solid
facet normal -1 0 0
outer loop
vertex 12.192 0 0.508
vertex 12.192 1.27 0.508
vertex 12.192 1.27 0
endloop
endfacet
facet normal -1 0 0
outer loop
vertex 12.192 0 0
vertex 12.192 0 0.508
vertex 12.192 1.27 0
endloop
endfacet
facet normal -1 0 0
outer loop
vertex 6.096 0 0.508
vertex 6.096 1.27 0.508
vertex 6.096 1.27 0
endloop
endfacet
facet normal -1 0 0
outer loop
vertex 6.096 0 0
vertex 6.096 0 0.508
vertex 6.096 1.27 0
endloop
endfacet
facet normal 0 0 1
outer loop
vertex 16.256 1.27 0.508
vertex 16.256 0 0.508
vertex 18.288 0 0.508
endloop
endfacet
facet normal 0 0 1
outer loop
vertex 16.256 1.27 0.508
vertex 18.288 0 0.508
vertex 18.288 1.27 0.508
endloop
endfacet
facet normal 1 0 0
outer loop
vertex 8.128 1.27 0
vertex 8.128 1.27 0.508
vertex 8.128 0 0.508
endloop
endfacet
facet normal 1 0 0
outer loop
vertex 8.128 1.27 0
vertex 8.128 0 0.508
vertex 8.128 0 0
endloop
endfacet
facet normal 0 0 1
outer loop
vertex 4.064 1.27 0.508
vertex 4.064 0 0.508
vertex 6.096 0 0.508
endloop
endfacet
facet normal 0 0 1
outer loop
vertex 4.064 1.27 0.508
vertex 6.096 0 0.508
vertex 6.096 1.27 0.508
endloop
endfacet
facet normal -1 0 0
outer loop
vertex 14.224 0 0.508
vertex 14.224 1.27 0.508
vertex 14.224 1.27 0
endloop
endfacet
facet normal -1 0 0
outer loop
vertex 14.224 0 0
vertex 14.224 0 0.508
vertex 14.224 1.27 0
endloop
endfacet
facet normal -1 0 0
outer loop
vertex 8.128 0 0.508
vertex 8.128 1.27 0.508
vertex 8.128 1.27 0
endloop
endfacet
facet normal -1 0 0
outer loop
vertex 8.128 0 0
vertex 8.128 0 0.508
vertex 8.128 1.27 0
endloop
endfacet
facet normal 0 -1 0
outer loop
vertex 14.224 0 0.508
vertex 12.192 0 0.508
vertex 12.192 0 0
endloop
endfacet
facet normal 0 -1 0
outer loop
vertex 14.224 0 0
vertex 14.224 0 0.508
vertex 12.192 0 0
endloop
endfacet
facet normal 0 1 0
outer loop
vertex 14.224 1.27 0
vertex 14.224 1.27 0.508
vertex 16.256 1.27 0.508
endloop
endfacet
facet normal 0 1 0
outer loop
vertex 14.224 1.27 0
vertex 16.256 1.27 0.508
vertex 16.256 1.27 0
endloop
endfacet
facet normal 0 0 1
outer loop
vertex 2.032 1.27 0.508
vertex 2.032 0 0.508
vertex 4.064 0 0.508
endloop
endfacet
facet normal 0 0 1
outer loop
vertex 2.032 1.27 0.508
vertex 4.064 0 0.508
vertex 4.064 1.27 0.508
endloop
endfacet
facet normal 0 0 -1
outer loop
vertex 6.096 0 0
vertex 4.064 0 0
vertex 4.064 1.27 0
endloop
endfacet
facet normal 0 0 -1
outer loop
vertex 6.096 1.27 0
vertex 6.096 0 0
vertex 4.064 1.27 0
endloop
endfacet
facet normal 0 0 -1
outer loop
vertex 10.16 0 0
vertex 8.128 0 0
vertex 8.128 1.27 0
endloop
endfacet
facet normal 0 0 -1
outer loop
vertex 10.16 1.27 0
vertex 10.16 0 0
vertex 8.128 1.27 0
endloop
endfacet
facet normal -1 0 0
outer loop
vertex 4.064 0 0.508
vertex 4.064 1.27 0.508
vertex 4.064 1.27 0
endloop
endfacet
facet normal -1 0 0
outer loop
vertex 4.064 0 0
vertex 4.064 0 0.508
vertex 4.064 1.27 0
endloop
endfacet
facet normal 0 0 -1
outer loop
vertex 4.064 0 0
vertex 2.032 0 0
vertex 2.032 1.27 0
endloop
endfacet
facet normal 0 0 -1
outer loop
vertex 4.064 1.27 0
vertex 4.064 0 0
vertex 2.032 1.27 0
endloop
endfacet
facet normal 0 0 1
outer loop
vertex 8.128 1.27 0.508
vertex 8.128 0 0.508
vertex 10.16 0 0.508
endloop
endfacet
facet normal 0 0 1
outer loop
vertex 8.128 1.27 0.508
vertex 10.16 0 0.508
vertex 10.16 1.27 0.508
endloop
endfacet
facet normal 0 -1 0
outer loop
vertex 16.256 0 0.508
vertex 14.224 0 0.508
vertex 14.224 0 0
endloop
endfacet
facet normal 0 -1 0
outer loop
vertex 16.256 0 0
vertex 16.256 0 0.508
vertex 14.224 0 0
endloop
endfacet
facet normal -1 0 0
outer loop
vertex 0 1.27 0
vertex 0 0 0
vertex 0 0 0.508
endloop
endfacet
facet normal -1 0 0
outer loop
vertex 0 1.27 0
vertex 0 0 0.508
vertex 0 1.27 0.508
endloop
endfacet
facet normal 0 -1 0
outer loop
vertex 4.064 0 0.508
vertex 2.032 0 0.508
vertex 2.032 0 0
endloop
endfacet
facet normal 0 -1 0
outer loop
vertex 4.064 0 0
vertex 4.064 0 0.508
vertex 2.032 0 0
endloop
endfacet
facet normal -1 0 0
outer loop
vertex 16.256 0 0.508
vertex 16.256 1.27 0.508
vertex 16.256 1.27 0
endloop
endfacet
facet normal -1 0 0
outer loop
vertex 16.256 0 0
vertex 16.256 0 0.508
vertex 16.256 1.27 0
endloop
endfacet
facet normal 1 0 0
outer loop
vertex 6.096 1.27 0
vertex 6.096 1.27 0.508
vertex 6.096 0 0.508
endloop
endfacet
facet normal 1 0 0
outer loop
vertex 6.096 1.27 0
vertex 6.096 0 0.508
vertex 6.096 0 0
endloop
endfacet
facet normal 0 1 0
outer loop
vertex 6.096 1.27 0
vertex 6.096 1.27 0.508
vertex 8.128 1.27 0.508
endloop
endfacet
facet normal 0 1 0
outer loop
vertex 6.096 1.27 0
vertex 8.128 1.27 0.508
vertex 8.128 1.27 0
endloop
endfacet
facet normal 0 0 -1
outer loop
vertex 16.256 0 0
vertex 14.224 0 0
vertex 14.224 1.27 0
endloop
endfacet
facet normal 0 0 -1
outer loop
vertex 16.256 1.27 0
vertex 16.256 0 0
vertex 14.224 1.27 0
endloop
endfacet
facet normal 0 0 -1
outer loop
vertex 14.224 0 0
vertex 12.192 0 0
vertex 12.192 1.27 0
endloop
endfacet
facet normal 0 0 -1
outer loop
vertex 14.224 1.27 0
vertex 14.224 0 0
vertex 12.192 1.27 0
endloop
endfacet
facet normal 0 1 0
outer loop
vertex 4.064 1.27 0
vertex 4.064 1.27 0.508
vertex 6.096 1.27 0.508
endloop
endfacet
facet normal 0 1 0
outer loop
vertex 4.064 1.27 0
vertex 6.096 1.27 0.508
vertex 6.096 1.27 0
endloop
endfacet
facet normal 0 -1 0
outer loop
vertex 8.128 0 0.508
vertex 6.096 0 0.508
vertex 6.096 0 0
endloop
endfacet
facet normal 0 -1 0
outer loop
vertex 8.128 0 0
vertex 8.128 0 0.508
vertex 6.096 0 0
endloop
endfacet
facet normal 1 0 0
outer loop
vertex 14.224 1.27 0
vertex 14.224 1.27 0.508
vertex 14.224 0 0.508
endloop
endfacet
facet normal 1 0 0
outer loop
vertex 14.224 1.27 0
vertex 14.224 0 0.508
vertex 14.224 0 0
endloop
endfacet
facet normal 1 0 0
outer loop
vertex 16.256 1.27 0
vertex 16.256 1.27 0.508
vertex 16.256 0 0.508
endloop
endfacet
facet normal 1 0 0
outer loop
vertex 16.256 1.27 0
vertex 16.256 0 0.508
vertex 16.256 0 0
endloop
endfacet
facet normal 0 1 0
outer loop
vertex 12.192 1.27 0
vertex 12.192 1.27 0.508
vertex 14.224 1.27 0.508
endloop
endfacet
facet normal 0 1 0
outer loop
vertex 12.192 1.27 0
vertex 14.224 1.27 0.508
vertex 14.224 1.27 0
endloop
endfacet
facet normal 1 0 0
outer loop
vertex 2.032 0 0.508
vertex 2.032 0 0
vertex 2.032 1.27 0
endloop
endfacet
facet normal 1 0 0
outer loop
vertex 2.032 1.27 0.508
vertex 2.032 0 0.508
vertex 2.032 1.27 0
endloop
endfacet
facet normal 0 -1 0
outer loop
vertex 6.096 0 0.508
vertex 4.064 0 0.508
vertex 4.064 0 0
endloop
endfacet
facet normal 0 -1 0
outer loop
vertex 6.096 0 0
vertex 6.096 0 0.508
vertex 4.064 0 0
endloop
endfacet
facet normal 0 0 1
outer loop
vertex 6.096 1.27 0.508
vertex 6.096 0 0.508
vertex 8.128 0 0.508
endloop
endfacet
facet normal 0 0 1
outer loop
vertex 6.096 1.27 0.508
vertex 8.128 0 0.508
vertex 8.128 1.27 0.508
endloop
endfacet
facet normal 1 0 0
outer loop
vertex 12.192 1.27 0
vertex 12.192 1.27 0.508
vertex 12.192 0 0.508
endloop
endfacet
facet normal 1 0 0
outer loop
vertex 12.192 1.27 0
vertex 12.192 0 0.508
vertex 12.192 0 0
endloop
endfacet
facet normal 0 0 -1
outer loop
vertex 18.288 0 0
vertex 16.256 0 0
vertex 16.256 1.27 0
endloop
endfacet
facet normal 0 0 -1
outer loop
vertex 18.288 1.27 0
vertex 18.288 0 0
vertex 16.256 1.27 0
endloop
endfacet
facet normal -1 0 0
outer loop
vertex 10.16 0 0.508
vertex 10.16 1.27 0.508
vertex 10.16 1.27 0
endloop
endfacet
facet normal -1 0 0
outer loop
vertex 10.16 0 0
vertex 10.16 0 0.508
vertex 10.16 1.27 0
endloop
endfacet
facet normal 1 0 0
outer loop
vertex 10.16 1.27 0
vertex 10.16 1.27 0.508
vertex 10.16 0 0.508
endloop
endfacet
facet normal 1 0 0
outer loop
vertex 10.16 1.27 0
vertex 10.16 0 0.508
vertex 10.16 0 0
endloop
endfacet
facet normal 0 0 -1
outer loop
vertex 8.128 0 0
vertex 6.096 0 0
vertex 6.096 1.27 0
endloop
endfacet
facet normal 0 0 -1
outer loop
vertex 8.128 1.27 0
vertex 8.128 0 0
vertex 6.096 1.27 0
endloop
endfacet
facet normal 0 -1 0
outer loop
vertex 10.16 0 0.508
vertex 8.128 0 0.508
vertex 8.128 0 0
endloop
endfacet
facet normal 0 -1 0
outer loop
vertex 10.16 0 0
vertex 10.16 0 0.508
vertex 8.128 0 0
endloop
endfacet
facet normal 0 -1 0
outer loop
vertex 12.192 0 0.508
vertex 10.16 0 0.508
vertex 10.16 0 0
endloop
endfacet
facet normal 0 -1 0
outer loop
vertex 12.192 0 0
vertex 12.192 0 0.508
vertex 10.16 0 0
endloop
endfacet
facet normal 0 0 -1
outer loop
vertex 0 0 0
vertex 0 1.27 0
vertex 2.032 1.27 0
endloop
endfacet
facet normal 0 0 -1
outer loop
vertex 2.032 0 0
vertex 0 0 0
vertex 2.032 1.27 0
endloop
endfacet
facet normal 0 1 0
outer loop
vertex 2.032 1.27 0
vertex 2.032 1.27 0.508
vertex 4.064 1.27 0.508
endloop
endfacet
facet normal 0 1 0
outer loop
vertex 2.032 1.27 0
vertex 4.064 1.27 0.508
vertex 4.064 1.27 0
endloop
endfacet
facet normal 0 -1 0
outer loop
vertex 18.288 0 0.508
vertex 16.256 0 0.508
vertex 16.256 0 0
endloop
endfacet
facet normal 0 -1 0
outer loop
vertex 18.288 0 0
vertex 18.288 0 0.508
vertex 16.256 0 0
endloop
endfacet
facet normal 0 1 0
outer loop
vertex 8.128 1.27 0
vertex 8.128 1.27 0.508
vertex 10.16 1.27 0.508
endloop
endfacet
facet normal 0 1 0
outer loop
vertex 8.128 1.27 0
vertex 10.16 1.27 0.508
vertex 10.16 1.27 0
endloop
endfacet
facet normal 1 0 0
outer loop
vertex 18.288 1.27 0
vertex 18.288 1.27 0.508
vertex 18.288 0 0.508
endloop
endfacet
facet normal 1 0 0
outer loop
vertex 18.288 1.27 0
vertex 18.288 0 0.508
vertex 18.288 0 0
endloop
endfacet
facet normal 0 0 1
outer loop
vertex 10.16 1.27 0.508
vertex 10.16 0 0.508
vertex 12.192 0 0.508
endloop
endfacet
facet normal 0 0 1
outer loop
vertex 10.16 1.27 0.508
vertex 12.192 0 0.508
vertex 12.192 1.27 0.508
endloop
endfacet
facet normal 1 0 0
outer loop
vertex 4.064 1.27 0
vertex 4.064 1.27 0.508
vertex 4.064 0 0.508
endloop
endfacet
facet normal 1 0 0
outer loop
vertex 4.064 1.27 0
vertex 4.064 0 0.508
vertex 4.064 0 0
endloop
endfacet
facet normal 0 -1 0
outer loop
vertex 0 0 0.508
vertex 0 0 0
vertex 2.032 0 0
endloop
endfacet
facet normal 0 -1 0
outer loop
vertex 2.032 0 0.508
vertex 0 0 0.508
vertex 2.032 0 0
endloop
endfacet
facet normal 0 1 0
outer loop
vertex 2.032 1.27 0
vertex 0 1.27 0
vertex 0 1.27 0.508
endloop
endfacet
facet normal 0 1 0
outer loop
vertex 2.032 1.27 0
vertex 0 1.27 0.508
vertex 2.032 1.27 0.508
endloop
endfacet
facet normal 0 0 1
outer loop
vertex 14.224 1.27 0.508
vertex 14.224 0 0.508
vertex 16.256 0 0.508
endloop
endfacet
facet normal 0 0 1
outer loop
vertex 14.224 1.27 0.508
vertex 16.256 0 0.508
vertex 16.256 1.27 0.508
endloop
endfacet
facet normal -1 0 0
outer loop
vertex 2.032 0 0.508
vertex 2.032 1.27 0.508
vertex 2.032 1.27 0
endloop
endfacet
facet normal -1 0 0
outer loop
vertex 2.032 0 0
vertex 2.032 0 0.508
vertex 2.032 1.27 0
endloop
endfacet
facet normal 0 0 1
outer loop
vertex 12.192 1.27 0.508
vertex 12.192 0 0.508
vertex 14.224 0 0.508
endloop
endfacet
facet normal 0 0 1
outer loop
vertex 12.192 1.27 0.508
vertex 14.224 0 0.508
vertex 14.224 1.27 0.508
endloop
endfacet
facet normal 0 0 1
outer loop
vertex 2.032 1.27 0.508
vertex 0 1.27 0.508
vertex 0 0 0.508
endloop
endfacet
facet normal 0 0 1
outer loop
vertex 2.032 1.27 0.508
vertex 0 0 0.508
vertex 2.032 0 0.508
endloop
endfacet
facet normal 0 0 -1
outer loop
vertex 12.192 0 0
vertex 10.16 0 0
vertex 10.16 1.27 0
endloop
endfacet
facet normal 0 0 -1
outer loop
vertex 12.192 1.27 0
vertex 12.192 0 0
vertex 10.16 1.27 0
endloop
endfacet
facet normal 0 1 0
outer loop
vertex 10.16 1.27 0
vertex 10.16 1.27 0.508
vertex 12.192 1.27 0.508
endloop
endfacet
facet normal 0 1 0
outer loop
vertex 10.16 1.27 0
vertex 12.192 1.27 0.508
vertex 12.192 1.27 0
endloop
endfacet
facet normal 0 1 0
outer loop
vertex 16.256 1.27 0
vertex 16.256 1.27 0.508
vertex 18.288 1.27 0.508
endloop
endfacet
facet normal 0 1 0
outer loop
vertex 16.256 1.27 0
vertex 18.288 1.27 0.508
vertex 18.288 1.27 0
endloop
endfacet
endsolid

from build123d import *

# Parameters (mm, degrees)
SKETCH1_W            = 2.032
SKETCH1_H            = 1.27
BOSS_EXTRUDE1_DEPTH  = 0.508
SKETCH3_W            = 0.508
SKETCH3_H            = 1.27
BOSS_EXTRUDE3_DEPTH  = 2.032
SKETCH4_W            = 0.508
SKETCH4_H            = 1.27
BOSS_EXTRUDE4_DEPTH  = 2.032
SKETCH5_W            = 0.508
SKETCH5_H            = 1.27
BOSS_EXTRUDE5_DEPTH  = 2.032
SKETCH6_W            = 0.508
SKETCH6_H            = 1.27
BOSS_EXTRUDE6_DEPTH  = 2.032
SKETCH7_W            = 0.508
SKETCH7_H            = 1.27
BOSS_EXTRUDE7_DEPTH  = 2.032
SKETCH8_W            = 0.508
SKETCH8_H            = 1.27
BOSS_EXTRUDE8_DEPTH  = 2.032
SKETCH9_W            = 0.508
SKETCH9_H            = 1.27
BOSS_EXTRUDE9_DEPTH  = 2.032
SKETCH10_W           = 0.508
SKETCH10_H           = 1.27
BOSS_EXTRUDE10_DEPTH = 2.032


with BuildPart() as part:
    # Sketch1 → Boss-Extrude1 (new body)
    with BuildSketch(Plane.XY):
        with Locations((1.016, 0.635)):
            Rectangle(SKETCH1_W, SKETCH1_H)
    extrude(amount=BOSS_EXTRUDE1_DEPTH)


with BuildPart() as body_2:
    # Sketch3 → Boss-Extrude3 (new body)
    with BuildSketch(Plane(origin=(2.032, 0, 0), x_dir=(0, 0, -1), z_dir=(1, 0, 0))):
        with Locations((-0.254, 0.635)):
            Rectangle(SKETCH3_W, SKETCH3_H)
    extrude(amount=BOSS_EXTRUDE3_DEPTH)


with BuildPart() as body_3:
    # Sketch4 → Boss-Extrude4 (new body)
    with BuildSketch(Plane(origin=(4.064, 0, 0), x_dir=(0, 0, -1), z_dir=(1, 0, 0))):
        with Locations((-0.254, 0.635)):
            Rectangle(SKETCH4_W, SKETCH4_H)
    extrude(amount=BOSS_EXTRUDE4_DEPTH)


with BuildPart() as body_4:
    # Sketch5 → Boss-Extrude5 (new body)
    with BuildSketch(Plane(origin=(6.096, 0, 0), x_dir=(0, 0, -1), z_dir=(1, 0, 0))):
        with Locations((-0.254, 0.635)):
            Rectangle(SKETCH5_W, SKETCH5_H)
    extrude(amount=BOSS_EXTRUDE5_DEPTH)


with BuildPart() as body_5:
    # Sketch6 → Boss-Extrude6 (new body)
    with BuildSketch(Plane(origin=(8.128, 0, 0), x_dir=(0, 0, -1), z_dir=(1, 0, 0))):
        with Locations((-0.254, 0.635)):
            Rectangle(SKETCH6_W, SKETCH6_H)
    extrude(amount=BOSS_EXTRUDE6_DEPTH)


with BuildPart() as body_6:
    # Sketch7 → Boss-Extrude7 (new body)
    with BuildSketch(Plane(origin=(10.16, 0, 0), x_dir=(0, 0, -1), z_dir=(1, 0, 0))):
        with Locations((-0.254, 0.635)):
            Rectangle(SKETCH7_W, SKETCH7_H)
    extrude(amount=BOSS_EXTRUDE7_DEPTH)


with BuildPart() as body_7:
    # Sketch8 → Boss-Extrude8 (new body)
    with BuildSketch(Plane(origin=(12.192, 0, 0), x_dir=(0, 0, -1), z_dir=(1, 0, 0))):
        with Locations((-0.254, 0.635)):
            Rectangle(SKETCH8_W, SKETCH8_H)
    extrude(amount=BOSS_EXTRUDE8_DEPTH)


with BuildPart() as body_8:
    # Sketch9 → Boss-Extrude9 (new body)
    with BuildSketch(Plane(origin=(14.224, 0, 0), x_dir=(0, 0, -1), z_dir=(1, 0, 0))):
        with Locations((-0.254, 0.635)):
            Rectangle(SKETCH9_W, SKETCH9_H)
    extrude(amount=BOSS_EXTRUDE9_DEPTH)


with BuildPart() as body_9:
    # Sketch10 → Boss-Extrude10 (new body)
    with BuildSketch(Plane(origin=(16.256, 0, 0), x_dir=(0, 0, -1), z_dir=(1, 0, 0))):
        with Locations((-0.254, 0.635)):
            Rectangle(SKETCH10_W, SKETCH10_H)
    extrude(amount=BOSS_EXTRUDE10_DEPTH)


solid = Compound([part.part, body_2.part, body_3.part, body_4.part, body_5.part, body_6.part, body_7.part, body_8.part, body_9.part])
